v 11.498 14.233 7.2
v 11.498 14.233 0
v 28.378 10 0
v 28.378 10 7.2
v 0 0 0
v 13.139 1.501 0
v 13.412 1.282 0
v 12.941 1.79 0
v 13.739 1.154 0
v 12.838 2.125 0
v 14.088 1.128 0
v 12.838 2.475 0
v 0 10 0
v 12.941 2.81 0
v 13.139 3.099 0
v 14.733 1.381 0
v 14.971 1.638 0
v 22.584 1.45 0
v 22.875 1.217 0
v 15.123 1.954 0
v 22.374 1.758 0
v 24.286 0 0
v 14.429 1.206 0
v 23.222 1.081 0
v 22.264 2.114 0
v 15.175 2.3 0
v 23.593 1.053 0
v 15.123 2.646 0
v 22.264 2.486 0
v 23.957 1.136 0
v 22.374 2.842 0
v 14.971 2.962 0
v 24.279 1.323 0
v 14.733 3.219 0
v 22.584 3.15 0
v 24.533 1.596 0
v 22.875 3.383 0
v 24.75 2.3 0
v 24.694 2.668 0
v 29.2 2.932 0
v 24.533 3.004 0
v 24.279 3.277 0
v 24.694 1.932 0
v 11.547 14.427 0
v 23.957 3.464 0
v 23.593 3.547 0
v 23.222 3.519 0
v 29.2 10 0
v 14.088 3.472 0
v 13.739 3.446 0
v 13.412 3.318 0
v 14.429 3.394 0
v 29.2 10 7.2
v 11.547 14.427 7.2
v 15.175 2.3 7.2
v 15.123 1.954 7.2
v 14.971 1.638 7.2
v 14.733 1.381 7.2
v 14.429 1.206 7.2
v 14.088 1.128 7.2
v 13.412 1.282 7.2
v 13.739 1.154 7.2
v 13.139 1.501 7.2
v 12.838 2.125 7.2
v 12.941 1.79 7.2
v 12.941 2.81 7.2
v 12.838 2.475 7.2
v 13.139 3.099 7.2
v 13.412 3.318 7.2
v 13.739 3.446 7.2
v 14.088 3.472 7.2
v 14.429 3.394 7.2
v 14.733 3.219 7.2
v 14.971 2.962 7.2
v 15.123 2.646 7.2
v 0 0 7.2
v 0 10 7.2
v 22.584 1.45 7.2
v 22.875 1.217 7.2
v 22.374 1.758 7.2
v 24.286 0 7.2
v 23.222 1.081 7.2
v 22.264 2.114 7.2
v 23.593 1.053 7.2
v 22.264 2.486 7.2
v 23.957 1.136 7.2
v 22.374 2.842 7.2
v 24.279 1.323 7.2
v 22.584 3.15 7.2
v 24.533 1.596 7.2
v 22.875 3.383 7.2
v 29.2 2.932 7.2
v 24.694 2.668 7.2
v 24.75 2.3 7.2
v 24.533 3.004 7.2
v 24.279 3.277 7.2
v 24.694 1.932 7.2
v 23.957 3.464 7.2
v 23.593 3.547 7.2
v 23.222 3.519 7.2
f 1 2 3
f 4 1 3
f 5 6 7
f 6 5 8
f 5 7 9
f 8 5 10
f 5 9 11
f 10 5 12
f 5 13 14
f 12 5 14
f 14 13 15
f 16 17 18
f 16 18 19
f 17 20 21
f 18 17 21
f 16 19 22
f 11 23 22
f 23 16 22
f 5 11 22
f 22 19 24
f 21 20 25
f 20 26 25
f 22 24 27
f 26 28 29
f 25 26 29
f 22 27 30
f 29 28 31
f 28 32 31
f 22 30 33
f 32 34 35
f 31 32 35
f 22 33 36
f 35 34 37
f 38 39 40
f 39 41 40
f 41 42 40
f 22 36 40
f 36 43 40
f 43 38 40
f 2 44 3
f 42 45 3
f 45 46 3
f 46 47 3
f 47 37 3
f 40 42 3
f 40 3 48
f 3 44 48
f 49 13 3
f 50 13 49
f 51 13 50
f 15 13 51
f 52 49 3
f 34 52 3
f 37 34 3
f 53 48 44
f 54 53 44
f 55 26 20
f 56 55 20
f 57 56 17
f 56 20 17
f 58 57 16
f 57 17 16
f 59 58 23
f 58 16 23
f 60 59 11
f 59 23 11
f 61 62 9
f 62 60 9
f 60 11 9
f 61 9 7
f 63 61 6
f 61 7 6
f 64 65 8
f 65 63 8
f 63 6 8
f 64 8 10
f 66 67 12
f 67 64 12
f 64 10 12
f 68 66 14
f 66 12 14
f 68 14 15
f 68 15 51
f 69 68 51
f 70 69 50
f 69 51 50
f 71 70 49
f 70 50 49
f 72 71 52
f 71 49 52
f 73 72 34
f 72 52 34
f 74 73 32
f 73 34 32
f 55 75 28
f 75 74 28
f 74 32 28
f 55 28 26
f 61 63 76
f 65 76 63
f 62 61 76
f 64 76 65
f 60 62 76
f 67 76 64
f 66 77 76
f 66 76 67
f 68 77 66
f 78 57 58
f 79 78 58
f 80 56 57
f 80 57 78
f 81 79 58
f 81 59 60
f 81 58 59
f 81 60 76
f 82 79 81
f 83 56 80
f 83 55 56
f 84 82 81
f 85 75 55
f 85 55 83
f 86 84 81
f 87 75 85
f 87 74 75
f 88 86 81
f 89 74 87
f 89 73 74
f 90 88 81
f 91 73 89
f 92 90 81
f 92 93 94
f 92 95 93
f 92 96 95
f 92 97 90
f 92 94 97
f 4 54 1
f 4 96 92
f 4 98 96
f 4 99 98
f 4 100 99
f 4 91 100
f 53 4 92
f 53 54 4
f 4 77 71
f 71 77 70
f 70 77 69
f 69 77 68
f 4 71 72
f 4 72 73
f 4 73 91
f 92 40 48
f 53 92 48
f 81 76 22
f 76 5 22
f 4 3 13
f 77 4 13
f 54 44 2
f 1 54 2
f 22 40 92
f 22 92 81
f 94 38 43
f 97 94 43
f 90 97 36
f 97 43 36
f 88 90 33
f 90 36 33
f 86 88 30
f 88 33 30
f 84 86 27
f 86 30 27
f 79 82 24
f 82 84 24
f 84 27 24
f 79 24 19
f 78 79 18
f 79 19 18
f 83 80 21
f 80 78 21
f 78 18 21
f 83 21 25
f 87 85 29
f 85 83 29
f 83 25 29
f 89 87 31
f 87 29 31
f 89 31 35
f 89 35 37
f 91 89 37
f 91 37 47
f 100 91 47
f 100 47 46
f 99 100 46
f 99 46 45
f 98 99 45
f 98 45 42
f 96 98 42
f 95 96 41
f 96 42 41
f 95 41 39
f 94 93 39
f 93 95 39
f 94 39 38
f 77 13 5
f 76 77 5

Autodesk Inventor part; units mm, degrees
ref_plane "YZ Plane" through (0, 0, 0) normal (1, 0, 0) x (0, 1, 0)
ref_plane "XZ Plane" through (0, 0, 0) normal (0, 1, 0) x (-1, 0, 0)
ref_plane "XY Plane" through (0, 0, 0) normal (0, 0, 1) x (1, 0, 0)
sketch "スケッチ1" plane through (0, 0, 0) normal (0, 0, 1) x (1, 0, 0)
  line L0 (0, 0) -> (24.2856, 0)
  line L1 (29.2, 2.9323) -> (29.2, 10)
  line L2 (28.3778, 10) -> (0, 10)
  line L3 (0, 10) -> (0, 0)
  circle A0 centre (23.5, 2.3) radius 1.25
  circle A1 centre (14, 2.3) radius 1.175
  line L4 (29.2, 2.9323) -> (24.2856, 0)
  line L5 (29.2, 10) -> (11.5467, 14.4273)
  line L6 (11.5467, 14.4273) -> (11.4981, 14.2333)
  line L7 (11.4981, 14.2333) -> (28.3778, 10)
  dimension "d2" = 2.5
  dimension "d3" = 2.35
  dimension "d4" = 18.2
  dimension "d5" = 0.2
extrude "押し出し1" add sketch "スケッチ1" along normal blind 7.2
properties part number "microswitch" material "ABS プラスチック"
